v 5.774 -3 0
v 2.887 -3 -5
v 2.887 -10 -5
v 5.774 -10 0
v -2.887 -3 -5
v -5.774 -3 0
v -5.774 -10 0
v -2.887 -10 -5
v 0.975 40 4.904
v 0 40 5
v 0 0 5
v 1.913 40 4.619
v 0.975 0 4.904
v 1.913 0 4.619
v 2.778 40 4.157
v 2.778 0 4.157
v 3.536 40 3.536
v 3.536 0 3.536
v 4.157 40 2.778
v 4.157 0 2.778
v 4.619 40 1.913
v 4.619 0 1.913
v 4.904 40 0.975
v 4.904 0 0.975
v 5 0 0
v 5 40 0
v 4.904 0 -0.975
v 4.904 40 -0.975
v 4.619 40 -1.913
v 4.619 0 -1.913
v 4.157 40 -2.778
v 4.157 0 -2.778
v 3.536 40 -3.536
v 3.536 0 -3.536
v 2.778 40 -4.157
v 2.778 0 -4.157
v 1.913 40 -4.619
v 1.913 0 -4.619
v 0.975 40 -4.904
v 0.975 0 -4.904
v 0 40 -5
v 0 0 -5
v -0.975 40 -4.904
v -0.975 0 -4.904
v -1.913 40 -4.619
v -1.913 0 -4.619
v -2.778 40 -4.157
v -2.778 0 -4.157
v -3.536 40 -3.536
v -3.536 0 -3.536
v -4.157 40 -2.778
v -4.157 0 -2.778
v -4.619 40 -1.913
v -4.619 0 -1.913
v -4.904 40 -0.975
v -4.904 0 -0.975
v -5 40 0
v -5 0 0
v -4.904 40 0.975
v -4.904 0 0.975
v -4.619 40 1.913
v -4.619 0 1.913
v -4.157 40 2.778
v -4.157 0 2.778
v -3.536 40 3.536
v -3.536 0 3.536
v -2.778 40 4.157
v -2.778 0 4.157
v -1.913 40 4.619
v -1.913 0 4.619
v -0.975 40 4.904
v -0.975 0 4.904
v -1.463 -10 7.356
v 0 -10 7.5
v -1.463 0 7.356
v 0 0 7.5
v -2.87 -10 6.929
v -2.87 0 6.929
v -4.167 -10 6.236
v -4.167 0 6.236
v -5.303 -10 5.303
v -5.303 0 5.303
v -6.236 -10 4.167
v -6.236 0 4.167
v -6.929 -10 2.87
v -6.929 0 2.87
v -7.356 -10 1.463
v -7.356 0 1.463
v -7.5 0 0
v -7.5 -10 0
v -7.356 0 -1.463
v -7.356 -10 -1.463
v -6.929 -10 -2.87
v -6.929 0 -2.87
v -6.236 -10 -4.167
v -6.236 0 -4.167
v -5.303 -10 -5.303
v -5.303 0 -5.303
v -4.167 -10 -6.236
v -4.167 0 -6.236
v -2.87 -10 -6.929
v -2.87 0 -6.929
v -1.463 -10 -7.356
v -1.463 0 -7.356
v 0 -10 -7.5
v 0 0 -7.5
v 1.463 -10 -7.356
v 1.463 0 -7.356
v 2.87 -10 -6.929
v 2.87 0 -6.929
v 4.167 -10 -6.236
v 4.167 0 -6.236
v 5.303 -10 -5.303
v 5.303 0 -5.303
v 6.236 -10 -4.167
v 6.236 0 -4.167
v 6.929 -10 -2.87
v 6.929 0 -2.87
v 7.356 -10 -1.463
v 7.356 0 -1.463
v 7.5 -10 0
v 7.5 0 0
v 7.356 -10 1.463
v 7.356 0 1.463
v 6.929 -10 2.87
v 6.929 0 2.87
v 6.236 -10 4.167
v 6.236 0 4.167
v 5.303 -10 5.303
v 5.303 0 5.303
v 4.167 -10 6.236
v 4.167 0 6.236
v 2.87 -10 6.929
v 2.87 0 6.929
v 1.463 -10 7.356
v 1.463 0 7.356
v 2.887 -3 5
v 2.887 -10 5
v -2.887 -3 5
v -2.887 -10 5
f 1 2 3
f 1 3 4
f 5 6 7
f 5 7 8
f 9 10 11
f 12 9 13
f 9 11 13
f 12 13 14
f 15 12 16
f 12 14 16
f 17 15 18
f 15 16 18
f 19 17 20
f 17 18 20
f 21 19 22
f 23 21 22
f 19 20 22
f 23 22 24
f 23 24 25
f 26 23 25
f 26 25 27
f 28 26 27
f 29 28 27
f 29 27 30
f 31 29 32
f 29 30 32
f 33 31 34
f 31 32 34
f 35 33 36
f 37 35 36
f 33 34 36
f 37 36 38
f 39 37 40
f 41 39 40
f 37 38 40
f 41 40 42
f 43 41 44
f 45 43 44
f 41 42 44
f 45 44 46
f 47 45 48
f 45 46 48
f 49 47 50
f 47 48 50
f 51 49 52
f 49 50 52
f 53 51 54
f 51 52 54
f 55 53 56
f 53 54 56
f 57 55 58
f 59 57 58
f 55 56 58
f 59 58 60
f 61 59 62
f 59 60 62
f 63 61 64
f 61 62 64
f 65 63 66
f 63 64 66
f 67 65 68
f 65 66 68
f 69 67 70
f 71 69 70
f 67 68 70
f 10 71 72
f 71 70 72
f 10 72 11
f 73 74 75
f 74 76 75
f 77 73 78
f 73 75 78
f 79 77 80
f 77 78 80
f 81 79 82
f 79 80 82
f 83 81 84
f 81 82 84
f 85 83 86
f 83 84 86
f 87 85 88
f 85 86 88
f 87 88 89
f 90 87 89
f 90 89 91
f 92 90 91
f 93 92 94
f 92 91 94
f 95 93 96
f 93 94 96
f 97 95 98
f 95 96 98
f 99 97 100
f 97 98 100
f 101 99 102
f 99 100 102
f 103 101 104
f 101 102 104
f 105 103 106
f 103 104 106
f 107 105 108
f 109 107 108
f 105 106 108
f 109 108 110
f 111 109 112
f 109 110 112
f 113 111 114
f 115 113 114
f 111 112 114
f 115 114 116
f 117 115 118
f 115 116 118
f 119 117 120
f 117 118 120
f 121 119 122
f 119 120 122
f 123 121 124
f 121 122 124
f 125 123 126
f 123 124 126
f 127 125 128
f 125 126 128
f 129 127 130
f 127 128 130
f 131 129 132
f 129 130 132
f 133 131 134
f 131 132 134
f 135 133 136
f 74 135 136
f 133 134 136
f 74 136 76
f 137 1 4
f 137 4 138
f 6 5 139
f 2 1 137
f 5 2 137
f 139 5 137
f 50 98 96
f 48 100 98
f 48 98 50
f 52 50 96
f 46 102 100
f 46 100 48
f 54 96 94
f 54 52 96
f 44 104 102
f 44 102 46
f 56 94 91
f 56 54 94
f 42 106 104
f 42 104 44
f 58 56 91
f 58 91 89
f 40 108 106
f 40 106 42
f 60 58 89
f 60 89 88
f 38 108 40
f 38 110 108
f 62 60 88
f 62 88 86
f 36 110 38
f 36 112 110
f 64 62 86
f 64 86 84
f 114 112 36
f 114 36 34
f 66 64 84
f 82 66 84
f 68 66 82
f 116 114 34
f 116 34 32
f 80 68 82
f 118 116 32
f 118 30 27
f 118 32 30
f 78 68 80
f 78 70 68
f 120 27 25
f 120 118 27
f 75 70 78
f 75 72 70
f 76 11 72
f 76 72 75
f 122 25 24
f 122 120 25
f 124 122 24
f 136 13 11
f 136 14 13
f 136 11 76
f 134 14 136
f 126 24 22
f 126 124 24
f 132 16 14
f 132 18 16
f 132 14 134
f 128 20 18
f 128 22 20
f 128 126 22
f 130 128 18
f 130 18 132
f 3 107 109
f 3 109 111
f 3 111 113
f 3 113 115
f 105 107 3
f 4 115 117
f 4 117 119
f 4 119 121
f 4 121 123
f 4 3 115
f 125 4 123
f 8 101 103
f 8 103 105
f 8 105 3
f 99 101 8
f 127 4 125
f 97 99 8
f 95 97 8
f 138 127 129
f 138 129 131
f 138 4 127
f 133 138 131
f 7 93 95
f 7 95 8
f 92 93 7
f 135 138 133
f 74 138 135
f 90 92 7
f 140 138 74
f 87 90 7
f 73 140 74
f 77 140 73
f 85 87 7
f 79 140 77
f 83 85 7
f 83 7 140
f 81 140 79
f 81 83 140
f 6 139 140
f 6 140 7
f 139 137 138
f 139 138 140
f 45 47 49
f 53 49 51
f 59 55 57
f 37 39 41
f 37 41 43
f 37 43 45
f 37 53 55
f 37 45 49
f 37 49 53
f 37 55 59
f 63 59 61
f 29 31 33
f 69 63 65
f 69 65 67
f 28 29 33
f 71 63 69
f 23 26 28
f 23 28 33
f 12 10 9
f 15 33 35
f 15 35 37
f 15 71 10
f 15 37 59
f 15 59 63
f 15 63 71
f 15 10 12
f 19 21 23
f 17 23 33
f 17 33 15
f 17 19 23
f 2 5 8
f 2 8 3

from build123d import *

# Parameters (mm, degrees)
BOSS_EXTRUDE1_DEPTH = 40
SKETCH1_3_R         = 7.5
BOSS_EXTRUDE2_DEPTH = 3
SKETCH2_R           = 7.5
BOSS_EXTRUDE3_DEPTH = 7


with BuildPart() as part:
    # Sketch1 → Boss-Extrude1 (new body)
    with BuildSketch(Plane(origin=(0, 0, 0), x_dir=(1, 0, 0), z_dir=(0, 1, 0))):
        with BuildLine():
            ThreePointArc((5, 0), (4.829629138, 1.294095202), (4.330127043, 2.499999958))
            ThreePointArc((4.330127043, 2.499999958), (2.500000021, 4.330127007), (0, 5))
            ThreePointArc((0, 5), (-2.499999995, 4.330127022), (-4.330127013, 2.500000011))
            ThreePointArc((-4.330127013, 2.500000011), (-5, 0), (-4.330127013, -2.500000011))
            ThreePointArc((-4.330127013, -2.500000011), (-2.499999995, -4.330127022), (0, -5))
            ThreePointArc((0, -5), (2.499999979, -4.330127031), (4.330126994, -2.500000043))
            ThreePointArc((4.330126994, -2.500000043), (4.829629125, -1.294095249), (5, 0))
        make_face()
    extrude(amount=BOSS_EXTRUDE1_DEPTH)

    # Sketch1<3> → Boss-Extrude2 (add)
    with BuildSketch(Plane(origin=(0, 0, 0), x_dir=(1, 0, 0), z_dir=(0, 1, 0))):
        Circle(SKETCH1_3_R)
    extrude(amount=-BOSS_EXTRUDE2_DEPTH)

    # Sketch2 → Boss-Extrude3 (add)
    with BuildSketch(Plane.XZ.offset(3)):
        Circle(SKETCH2_R)
        Polygon((5.773502692, 0), (2.886751346, 5), (-2.886751346, 5), (-5.773502692, 0), (-2.886751346, -5), (2.886751346, -5), align=None, mode=Mode.SUBTRACT)
    extrude(amount=BOSS_EXTRUDE3_DEPTH)


solid = part.part
